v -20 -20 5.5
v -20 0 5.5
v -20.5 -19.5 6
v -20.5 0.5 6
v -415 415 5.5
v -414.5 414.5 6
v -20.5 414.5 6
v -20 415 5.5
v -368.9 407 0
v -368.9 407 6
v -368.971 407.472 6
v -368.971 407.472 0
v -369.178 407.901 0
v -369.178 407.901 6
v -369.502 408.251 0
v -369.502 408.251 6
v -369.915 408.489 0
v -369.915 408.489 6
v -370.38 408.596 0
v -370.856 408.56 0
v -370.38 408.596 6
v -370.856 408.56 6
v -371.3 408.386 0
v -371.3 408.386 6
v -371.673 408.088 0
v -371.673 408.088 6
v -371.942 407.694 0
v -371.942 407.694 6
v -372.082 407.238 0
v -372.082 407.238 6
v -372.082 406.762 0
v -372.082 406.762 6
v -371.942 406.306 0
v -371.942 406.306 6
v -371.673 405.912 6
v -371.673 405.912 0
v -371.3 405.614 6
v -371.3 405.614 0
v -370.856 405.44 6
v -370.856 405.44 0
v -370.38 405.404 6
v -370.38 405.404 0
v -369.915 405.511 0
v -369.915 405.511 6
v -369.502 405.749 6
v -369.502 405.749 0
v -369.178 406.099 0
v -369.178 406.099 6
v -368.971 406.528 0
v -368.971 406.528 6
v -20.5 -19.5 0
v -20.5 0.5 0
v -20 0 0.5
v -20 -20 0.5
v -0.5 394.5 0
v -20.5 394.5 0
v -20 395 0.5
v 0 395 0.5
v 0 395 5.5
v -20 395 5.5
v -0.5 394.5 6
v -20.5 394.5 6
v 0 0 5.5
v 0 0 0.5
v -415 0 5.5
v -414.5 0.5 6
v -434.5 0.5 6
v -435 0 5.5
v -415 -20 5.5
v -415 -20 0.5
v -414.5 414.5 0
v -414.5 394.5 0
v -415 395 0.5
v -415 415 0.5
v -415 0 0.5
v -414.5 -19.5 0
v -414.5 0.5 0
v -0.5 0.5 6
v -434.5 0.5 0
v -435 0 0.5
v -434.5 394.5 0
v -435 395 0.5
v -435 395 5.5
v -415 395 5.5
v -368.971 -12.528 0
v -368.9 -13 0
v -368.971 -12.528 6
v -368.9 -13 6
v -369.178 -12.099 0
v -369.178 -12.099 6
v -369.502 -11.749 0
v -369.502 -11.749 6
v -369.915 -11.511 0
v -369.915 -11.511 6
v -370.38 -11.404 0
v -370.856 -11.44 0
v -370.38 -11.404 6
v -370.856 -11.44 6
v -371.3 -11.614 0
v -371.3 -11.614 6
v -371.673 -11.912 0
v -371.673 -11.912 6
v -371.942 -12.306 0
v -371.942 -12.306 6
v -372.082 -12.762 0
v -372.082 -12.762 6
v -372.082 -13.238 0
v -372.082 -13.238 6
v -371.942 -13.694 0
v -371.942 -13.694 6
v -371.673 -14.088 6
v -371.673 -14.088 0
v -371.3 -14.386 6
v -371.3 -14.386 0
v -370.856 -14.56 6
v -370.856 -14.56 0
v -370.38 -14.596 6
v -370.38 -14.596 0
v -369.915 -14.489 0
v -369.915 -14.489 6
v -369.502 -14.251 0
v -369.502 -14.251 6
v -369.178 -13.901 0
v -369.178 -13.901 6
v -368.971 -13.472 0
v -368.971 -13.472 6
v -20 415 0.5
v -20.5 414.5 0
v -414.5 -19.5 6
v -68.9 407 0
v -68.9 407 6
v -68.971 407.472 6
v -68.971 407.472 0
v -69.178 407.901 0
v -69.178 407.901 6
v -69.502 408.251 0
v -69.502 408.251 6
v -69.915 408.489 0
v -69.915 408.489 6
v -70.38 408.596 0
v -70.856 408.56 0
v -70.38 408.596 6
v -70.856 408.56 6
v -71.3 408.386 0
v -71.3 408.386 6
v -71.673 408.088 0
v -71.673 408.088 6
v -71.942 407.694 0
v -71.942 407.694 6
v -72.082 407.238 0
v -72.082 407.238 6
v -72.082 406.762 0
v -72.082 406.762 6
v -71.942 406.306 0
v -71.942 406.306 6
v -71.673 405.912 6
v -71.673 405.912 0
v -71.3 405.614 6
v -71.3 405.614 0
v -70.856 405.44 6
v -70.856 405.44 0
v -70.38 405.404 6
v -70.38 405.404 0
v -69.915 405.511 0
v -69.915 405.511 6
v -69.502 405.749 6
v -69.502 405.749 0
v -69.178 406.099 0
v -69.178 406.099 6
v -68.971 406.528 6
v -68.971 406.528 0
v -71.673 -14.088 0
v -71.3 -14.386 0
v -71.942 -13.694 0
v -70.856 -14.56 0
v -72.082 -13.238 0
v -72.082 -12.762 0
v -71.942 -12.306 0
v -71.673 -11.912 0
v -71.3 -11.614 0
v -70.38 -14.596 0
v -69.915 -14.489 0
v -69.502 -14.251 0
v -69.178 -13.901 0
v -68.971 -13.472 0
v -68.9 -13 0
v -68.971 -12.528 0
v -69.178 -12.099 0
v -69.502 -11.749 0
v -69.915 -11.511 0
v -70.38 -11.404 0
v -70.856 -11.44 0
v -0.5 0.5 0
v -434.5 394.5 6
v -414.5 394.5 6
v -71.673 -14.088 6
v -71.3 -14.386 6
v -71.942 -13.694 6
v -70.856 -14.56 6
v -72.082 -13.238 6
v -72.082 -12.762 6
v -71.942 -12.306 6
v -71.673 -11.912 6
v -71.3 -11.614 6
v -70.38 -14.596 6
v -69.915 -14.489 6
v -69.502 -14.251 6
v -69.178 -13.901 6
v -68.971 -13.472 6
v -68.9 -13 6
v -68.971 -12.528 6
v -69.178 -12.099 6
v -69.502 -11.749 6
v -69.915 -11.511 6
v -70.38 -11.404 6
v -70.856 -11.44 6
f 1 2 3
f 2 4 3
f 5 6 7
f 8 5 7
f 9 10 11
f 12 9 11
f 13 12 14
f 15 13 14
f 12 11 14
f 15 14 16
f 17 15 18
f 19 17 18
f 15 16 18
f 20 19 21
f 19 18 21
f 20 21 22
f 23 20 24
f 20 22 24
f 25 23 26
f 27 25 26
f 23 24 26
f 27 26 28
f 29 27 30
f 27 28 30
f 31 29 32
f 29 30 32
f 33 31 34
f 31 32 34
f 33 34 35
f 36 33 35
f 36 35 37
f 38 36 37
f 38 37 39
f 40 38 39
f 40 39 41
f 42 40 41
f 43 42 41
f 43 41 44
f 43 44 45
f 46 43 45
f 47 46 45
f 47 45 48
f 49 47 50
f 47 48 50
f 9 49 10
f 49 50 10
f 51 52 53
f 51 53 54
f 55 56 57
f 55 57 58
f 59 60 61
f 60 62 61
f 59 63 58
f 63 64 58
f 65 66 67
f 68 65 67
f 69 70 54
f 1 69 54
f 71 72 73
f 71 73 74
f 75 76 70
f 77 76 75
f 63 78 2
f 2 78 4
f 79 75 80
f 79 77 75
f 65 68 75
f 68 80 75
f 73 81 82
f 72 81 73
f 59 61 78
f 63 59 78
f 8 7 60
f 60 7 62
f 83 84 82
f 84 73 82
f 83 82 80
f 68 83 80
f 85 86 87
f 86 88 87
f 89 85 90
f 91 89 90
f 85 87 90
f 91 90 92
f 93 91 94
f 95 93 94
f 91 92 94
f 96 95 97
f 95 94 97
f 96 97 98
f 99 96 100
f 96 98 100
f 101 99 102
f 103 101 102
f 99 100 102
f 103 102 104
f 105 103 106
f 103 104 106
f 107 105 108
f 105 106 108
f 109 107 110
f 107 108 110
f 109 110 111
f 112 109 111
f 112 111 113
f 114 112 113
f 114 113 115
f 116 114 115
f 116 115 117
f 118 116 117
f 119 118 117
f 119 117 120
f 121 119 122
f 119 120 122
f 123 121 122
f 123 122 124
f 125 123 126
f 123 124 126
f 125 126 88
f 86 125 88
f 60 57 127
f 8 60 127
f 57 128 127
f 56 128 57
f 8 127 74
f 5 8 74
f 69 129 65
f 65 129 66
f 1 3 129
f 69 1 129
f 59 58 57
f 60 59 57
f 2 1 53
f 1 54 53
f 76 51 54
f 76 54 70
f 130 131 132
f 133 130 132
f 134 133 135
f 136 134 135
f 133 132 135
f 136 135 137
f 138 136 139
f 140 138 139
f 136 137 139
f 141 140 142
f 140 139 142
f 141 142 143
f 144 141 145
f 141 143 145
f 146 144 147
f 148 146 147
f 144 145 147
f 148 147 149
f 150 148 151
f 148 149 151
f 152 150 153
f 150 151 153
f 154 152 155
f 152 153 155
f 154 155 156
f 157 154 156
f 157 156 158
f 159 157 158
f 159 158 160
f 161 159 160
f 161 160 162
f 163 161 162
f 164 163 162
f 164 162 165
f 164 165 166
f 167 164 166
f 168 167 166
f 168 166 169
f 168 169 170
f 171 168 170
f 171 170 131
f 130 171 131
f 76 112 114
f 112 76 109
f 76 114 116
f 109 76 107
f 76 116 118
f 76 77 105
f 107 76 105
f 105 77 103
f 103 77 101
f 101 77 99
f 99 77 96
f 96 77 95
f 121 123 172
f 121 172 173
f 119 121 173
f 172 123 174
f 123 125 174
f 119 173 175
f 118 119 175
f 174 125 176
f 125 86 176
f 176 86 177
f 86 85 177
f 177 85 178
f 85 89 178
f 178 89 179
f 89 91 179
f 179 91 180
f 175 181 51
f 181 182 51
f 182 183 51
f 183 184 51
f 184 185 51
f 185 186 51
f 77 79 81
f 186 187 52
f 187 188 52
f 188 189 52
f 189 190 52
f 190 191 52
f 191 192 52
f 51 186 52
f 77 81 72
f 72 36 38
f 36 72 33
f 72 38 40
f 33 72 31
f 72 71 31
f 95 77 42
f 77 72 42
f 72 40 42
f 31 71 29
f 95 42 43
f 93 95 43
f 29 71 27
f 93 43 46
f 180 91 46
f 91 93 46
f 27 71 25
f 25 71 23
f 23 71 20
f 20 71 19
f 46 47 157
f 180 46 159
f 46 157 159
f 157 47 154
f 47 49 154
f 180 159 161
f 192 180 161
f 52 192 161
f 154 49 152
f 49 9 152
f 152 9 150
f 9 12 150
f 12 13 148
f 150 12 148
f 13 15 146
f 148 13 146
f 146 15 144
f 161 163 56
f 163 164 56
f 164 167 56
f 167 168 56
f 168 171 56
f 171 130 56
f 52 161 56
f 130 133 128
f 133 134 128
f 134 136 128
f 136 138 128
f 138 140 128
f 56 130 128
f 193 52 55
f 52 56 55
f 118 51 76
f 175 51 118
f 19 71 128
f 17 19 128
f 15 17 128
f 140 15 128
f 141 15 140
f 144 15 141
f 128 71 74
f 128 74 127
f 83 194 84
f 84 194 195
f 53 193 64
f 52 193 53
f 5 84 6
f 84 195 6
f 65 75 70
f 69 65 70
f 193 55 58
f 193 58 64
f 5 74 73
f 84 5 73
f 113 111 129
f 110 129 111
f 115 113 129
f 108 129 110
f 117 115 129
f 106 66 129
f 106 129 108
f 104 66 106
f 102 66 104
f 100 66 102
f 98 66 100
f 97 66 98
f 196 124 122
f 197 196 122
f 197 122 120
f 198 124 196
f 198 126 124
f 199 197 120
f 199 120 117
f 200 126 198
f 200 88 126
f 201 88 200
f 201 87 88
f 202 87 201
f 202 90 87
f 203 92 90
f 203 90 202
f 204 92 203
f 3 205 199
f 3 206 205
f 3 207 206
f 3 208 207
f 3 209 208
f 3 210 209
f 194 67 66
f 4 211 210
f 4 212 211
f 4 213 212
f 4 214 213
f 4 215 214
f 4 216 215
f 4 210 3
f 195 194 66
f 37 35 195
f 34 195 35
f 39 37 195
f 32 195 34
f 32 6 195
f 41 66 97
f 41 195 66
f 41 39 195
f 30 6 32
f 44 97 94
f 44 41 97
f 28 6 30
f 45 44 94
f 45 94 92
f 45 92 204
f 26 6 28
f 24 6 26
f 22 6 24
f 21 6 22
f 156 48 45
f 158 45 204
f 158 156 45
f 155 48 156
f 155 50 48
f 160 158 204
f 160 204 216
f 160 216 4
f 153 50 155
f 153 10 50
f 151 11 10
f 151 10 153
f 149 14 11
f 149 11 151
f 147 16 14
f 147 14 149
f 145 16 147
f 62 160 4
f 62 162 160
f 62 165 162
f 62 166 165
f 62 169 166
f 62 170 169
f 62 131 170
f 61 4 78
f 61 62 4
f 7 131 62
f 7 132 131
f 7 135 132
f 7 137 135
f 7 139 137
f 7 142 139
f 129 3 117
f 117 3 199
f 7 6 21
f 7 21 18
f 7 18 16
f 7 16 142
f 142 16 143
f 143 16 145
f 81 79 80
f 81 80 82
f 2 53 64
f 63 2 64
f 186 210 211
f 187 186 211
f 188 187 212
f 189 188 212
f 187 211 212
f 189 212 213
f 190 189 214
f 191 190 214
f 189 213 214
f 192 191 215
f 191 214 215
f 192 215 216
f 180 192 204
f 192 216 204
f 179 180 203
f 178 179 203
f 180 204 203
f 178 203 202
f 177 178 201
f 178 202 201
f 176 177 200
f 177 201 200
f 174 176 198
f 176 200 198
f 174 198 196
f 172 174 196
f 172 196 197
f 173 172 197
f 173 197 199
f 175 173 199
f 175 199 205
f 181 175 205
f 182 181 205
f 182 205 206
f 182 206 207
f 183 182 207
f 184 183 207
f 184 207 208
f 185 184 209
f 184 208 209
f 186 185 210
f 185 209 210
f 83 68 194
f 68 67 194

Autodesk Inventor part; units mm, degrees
ref_plane "YZ Plane" through (0, 0, 0) normal (1, 0, 0) x (0, 1, 0)
ref_plane "XZ Plane" through (0, 0, 0) normal (0, 1, 0) x (-1, 0, 0)
ref_plane "XY Plane" through (0, 0, 0) normal (0, 0, 1) x (1, 0, 0)
sketch "Skizze1" plane through (0, 0, 0) normal (0, 0, 1) x (1, 0, 0)
  line L0 (0, 0) -> (0, 395)
  line L1 (0, 395) -> (-20, 395)
  line L2 (-20, 395) -> (-20, 415)
  line L3 (-20, 415) -> (-117.5, 415)
  line L4 (-317.5, 415) -> (-415, 415)
  line L5 (-415, 415) -> (-415, 395)
  line L6 (-415, 395) -> (-435, 395)
  line L7 (-435, 395) -> (-435, 0)
  line L8 (-435, 0) -> (-415, 0)
  line L9 (-415, 0) -> (-415, -20)
  line L10 (-415, 0) -> (-395, 0) construction
  line L11 (-415, -20) -> (-317.5, -20)
  line L12 (-117.5, -20) -> (-20, -20)
  line L13 (-20, -20) -> (-20, 0)
  line L14 (-20, 0) -> (0, 0)
  line L15 (-117.5, 415) -> (-317.5, 415)
  line L16 (-317.5, -20) -> (-117.5, -20)
  dimension "d0" = 395
  dimension "d1" = 20
  dimension "d2" = 20
  dimension "d3" = 97.5
  dimension "d4" = 90
  dimension "d10" = 97.5
  dimension "d11" = 20
  dimension "d12" = 90
  dimension "d13" = 20
  dimension "d14" = 90
  dimension "d15" = 395
  dimension "d17" = 20
  dimension "d18" = 20
  dimension "d19" = 90
  dimension "d40" = 395
extrude "Extrusion1" add sketch "Skizze1" along normal blind 6
chamfer "Fase1" distance 0.5 angle 45 32 edges at (0, 197.5, 6) (-10, 0, 6) (-20, -10, 6) (-68.75, -20, 6) (-217.5, -20, 6) (-366.25, -20, 6) (-415, -10, 6) (-425, 0, 6) (-435, 197.5, 6) (-425, 395, 6) (-415, 405, 6) (-366.25, 415, 6) (-217.5, 415, 6) (-68.75, 415, 6) (-20, 405, 6) (-10, 395, 6) (-425, 0, 0) (-415, -10, 0) (-435, 197.5, 0) (-366.25, -20, 0) (-10, 0, 0) (-20, -10, 0) (-68.75, -20, 0) (-217.5, -20, 0) (-425, 395, 0) (-415, 405, 0) (-366.25, 415, 0) (-217.5, 415, 0) (-68.75, 415, 0) (-20, 405, 0) (-10, 395, 0) (0, 197.5, 0)
sketch "Skizze2" plane through (0, 0, 6) normal (0, 0, 1) x (1, 0, 0)
  circle A0 centre (-70.5, 407) radius 1.6
  line L0 (-414.5, 414.5) -> (-20.5, 414.5) projected
  line L1 (-20.5, 414.5) -> (-20.5, 394.5) projected
  circle A1 centre (-370.5, 407) radius 1.6
  circle A2 centre (-70.5, -13) radius 1.6
  circle A3 centre (-370.5, -13) radius 1.6
  point P0 (0, 0)
  point P1 (-117, 414.5)
  dimension "d27" = 3.2
  dimension "d28" = 7.5
  dimension "d29" = 50
  dimension "d32" = 300
  dimension "d35" = 420
extrude "Extrusion2" cut sketch "Skizze2" against normal through all
properties part number "middle plate" material "Birke"
